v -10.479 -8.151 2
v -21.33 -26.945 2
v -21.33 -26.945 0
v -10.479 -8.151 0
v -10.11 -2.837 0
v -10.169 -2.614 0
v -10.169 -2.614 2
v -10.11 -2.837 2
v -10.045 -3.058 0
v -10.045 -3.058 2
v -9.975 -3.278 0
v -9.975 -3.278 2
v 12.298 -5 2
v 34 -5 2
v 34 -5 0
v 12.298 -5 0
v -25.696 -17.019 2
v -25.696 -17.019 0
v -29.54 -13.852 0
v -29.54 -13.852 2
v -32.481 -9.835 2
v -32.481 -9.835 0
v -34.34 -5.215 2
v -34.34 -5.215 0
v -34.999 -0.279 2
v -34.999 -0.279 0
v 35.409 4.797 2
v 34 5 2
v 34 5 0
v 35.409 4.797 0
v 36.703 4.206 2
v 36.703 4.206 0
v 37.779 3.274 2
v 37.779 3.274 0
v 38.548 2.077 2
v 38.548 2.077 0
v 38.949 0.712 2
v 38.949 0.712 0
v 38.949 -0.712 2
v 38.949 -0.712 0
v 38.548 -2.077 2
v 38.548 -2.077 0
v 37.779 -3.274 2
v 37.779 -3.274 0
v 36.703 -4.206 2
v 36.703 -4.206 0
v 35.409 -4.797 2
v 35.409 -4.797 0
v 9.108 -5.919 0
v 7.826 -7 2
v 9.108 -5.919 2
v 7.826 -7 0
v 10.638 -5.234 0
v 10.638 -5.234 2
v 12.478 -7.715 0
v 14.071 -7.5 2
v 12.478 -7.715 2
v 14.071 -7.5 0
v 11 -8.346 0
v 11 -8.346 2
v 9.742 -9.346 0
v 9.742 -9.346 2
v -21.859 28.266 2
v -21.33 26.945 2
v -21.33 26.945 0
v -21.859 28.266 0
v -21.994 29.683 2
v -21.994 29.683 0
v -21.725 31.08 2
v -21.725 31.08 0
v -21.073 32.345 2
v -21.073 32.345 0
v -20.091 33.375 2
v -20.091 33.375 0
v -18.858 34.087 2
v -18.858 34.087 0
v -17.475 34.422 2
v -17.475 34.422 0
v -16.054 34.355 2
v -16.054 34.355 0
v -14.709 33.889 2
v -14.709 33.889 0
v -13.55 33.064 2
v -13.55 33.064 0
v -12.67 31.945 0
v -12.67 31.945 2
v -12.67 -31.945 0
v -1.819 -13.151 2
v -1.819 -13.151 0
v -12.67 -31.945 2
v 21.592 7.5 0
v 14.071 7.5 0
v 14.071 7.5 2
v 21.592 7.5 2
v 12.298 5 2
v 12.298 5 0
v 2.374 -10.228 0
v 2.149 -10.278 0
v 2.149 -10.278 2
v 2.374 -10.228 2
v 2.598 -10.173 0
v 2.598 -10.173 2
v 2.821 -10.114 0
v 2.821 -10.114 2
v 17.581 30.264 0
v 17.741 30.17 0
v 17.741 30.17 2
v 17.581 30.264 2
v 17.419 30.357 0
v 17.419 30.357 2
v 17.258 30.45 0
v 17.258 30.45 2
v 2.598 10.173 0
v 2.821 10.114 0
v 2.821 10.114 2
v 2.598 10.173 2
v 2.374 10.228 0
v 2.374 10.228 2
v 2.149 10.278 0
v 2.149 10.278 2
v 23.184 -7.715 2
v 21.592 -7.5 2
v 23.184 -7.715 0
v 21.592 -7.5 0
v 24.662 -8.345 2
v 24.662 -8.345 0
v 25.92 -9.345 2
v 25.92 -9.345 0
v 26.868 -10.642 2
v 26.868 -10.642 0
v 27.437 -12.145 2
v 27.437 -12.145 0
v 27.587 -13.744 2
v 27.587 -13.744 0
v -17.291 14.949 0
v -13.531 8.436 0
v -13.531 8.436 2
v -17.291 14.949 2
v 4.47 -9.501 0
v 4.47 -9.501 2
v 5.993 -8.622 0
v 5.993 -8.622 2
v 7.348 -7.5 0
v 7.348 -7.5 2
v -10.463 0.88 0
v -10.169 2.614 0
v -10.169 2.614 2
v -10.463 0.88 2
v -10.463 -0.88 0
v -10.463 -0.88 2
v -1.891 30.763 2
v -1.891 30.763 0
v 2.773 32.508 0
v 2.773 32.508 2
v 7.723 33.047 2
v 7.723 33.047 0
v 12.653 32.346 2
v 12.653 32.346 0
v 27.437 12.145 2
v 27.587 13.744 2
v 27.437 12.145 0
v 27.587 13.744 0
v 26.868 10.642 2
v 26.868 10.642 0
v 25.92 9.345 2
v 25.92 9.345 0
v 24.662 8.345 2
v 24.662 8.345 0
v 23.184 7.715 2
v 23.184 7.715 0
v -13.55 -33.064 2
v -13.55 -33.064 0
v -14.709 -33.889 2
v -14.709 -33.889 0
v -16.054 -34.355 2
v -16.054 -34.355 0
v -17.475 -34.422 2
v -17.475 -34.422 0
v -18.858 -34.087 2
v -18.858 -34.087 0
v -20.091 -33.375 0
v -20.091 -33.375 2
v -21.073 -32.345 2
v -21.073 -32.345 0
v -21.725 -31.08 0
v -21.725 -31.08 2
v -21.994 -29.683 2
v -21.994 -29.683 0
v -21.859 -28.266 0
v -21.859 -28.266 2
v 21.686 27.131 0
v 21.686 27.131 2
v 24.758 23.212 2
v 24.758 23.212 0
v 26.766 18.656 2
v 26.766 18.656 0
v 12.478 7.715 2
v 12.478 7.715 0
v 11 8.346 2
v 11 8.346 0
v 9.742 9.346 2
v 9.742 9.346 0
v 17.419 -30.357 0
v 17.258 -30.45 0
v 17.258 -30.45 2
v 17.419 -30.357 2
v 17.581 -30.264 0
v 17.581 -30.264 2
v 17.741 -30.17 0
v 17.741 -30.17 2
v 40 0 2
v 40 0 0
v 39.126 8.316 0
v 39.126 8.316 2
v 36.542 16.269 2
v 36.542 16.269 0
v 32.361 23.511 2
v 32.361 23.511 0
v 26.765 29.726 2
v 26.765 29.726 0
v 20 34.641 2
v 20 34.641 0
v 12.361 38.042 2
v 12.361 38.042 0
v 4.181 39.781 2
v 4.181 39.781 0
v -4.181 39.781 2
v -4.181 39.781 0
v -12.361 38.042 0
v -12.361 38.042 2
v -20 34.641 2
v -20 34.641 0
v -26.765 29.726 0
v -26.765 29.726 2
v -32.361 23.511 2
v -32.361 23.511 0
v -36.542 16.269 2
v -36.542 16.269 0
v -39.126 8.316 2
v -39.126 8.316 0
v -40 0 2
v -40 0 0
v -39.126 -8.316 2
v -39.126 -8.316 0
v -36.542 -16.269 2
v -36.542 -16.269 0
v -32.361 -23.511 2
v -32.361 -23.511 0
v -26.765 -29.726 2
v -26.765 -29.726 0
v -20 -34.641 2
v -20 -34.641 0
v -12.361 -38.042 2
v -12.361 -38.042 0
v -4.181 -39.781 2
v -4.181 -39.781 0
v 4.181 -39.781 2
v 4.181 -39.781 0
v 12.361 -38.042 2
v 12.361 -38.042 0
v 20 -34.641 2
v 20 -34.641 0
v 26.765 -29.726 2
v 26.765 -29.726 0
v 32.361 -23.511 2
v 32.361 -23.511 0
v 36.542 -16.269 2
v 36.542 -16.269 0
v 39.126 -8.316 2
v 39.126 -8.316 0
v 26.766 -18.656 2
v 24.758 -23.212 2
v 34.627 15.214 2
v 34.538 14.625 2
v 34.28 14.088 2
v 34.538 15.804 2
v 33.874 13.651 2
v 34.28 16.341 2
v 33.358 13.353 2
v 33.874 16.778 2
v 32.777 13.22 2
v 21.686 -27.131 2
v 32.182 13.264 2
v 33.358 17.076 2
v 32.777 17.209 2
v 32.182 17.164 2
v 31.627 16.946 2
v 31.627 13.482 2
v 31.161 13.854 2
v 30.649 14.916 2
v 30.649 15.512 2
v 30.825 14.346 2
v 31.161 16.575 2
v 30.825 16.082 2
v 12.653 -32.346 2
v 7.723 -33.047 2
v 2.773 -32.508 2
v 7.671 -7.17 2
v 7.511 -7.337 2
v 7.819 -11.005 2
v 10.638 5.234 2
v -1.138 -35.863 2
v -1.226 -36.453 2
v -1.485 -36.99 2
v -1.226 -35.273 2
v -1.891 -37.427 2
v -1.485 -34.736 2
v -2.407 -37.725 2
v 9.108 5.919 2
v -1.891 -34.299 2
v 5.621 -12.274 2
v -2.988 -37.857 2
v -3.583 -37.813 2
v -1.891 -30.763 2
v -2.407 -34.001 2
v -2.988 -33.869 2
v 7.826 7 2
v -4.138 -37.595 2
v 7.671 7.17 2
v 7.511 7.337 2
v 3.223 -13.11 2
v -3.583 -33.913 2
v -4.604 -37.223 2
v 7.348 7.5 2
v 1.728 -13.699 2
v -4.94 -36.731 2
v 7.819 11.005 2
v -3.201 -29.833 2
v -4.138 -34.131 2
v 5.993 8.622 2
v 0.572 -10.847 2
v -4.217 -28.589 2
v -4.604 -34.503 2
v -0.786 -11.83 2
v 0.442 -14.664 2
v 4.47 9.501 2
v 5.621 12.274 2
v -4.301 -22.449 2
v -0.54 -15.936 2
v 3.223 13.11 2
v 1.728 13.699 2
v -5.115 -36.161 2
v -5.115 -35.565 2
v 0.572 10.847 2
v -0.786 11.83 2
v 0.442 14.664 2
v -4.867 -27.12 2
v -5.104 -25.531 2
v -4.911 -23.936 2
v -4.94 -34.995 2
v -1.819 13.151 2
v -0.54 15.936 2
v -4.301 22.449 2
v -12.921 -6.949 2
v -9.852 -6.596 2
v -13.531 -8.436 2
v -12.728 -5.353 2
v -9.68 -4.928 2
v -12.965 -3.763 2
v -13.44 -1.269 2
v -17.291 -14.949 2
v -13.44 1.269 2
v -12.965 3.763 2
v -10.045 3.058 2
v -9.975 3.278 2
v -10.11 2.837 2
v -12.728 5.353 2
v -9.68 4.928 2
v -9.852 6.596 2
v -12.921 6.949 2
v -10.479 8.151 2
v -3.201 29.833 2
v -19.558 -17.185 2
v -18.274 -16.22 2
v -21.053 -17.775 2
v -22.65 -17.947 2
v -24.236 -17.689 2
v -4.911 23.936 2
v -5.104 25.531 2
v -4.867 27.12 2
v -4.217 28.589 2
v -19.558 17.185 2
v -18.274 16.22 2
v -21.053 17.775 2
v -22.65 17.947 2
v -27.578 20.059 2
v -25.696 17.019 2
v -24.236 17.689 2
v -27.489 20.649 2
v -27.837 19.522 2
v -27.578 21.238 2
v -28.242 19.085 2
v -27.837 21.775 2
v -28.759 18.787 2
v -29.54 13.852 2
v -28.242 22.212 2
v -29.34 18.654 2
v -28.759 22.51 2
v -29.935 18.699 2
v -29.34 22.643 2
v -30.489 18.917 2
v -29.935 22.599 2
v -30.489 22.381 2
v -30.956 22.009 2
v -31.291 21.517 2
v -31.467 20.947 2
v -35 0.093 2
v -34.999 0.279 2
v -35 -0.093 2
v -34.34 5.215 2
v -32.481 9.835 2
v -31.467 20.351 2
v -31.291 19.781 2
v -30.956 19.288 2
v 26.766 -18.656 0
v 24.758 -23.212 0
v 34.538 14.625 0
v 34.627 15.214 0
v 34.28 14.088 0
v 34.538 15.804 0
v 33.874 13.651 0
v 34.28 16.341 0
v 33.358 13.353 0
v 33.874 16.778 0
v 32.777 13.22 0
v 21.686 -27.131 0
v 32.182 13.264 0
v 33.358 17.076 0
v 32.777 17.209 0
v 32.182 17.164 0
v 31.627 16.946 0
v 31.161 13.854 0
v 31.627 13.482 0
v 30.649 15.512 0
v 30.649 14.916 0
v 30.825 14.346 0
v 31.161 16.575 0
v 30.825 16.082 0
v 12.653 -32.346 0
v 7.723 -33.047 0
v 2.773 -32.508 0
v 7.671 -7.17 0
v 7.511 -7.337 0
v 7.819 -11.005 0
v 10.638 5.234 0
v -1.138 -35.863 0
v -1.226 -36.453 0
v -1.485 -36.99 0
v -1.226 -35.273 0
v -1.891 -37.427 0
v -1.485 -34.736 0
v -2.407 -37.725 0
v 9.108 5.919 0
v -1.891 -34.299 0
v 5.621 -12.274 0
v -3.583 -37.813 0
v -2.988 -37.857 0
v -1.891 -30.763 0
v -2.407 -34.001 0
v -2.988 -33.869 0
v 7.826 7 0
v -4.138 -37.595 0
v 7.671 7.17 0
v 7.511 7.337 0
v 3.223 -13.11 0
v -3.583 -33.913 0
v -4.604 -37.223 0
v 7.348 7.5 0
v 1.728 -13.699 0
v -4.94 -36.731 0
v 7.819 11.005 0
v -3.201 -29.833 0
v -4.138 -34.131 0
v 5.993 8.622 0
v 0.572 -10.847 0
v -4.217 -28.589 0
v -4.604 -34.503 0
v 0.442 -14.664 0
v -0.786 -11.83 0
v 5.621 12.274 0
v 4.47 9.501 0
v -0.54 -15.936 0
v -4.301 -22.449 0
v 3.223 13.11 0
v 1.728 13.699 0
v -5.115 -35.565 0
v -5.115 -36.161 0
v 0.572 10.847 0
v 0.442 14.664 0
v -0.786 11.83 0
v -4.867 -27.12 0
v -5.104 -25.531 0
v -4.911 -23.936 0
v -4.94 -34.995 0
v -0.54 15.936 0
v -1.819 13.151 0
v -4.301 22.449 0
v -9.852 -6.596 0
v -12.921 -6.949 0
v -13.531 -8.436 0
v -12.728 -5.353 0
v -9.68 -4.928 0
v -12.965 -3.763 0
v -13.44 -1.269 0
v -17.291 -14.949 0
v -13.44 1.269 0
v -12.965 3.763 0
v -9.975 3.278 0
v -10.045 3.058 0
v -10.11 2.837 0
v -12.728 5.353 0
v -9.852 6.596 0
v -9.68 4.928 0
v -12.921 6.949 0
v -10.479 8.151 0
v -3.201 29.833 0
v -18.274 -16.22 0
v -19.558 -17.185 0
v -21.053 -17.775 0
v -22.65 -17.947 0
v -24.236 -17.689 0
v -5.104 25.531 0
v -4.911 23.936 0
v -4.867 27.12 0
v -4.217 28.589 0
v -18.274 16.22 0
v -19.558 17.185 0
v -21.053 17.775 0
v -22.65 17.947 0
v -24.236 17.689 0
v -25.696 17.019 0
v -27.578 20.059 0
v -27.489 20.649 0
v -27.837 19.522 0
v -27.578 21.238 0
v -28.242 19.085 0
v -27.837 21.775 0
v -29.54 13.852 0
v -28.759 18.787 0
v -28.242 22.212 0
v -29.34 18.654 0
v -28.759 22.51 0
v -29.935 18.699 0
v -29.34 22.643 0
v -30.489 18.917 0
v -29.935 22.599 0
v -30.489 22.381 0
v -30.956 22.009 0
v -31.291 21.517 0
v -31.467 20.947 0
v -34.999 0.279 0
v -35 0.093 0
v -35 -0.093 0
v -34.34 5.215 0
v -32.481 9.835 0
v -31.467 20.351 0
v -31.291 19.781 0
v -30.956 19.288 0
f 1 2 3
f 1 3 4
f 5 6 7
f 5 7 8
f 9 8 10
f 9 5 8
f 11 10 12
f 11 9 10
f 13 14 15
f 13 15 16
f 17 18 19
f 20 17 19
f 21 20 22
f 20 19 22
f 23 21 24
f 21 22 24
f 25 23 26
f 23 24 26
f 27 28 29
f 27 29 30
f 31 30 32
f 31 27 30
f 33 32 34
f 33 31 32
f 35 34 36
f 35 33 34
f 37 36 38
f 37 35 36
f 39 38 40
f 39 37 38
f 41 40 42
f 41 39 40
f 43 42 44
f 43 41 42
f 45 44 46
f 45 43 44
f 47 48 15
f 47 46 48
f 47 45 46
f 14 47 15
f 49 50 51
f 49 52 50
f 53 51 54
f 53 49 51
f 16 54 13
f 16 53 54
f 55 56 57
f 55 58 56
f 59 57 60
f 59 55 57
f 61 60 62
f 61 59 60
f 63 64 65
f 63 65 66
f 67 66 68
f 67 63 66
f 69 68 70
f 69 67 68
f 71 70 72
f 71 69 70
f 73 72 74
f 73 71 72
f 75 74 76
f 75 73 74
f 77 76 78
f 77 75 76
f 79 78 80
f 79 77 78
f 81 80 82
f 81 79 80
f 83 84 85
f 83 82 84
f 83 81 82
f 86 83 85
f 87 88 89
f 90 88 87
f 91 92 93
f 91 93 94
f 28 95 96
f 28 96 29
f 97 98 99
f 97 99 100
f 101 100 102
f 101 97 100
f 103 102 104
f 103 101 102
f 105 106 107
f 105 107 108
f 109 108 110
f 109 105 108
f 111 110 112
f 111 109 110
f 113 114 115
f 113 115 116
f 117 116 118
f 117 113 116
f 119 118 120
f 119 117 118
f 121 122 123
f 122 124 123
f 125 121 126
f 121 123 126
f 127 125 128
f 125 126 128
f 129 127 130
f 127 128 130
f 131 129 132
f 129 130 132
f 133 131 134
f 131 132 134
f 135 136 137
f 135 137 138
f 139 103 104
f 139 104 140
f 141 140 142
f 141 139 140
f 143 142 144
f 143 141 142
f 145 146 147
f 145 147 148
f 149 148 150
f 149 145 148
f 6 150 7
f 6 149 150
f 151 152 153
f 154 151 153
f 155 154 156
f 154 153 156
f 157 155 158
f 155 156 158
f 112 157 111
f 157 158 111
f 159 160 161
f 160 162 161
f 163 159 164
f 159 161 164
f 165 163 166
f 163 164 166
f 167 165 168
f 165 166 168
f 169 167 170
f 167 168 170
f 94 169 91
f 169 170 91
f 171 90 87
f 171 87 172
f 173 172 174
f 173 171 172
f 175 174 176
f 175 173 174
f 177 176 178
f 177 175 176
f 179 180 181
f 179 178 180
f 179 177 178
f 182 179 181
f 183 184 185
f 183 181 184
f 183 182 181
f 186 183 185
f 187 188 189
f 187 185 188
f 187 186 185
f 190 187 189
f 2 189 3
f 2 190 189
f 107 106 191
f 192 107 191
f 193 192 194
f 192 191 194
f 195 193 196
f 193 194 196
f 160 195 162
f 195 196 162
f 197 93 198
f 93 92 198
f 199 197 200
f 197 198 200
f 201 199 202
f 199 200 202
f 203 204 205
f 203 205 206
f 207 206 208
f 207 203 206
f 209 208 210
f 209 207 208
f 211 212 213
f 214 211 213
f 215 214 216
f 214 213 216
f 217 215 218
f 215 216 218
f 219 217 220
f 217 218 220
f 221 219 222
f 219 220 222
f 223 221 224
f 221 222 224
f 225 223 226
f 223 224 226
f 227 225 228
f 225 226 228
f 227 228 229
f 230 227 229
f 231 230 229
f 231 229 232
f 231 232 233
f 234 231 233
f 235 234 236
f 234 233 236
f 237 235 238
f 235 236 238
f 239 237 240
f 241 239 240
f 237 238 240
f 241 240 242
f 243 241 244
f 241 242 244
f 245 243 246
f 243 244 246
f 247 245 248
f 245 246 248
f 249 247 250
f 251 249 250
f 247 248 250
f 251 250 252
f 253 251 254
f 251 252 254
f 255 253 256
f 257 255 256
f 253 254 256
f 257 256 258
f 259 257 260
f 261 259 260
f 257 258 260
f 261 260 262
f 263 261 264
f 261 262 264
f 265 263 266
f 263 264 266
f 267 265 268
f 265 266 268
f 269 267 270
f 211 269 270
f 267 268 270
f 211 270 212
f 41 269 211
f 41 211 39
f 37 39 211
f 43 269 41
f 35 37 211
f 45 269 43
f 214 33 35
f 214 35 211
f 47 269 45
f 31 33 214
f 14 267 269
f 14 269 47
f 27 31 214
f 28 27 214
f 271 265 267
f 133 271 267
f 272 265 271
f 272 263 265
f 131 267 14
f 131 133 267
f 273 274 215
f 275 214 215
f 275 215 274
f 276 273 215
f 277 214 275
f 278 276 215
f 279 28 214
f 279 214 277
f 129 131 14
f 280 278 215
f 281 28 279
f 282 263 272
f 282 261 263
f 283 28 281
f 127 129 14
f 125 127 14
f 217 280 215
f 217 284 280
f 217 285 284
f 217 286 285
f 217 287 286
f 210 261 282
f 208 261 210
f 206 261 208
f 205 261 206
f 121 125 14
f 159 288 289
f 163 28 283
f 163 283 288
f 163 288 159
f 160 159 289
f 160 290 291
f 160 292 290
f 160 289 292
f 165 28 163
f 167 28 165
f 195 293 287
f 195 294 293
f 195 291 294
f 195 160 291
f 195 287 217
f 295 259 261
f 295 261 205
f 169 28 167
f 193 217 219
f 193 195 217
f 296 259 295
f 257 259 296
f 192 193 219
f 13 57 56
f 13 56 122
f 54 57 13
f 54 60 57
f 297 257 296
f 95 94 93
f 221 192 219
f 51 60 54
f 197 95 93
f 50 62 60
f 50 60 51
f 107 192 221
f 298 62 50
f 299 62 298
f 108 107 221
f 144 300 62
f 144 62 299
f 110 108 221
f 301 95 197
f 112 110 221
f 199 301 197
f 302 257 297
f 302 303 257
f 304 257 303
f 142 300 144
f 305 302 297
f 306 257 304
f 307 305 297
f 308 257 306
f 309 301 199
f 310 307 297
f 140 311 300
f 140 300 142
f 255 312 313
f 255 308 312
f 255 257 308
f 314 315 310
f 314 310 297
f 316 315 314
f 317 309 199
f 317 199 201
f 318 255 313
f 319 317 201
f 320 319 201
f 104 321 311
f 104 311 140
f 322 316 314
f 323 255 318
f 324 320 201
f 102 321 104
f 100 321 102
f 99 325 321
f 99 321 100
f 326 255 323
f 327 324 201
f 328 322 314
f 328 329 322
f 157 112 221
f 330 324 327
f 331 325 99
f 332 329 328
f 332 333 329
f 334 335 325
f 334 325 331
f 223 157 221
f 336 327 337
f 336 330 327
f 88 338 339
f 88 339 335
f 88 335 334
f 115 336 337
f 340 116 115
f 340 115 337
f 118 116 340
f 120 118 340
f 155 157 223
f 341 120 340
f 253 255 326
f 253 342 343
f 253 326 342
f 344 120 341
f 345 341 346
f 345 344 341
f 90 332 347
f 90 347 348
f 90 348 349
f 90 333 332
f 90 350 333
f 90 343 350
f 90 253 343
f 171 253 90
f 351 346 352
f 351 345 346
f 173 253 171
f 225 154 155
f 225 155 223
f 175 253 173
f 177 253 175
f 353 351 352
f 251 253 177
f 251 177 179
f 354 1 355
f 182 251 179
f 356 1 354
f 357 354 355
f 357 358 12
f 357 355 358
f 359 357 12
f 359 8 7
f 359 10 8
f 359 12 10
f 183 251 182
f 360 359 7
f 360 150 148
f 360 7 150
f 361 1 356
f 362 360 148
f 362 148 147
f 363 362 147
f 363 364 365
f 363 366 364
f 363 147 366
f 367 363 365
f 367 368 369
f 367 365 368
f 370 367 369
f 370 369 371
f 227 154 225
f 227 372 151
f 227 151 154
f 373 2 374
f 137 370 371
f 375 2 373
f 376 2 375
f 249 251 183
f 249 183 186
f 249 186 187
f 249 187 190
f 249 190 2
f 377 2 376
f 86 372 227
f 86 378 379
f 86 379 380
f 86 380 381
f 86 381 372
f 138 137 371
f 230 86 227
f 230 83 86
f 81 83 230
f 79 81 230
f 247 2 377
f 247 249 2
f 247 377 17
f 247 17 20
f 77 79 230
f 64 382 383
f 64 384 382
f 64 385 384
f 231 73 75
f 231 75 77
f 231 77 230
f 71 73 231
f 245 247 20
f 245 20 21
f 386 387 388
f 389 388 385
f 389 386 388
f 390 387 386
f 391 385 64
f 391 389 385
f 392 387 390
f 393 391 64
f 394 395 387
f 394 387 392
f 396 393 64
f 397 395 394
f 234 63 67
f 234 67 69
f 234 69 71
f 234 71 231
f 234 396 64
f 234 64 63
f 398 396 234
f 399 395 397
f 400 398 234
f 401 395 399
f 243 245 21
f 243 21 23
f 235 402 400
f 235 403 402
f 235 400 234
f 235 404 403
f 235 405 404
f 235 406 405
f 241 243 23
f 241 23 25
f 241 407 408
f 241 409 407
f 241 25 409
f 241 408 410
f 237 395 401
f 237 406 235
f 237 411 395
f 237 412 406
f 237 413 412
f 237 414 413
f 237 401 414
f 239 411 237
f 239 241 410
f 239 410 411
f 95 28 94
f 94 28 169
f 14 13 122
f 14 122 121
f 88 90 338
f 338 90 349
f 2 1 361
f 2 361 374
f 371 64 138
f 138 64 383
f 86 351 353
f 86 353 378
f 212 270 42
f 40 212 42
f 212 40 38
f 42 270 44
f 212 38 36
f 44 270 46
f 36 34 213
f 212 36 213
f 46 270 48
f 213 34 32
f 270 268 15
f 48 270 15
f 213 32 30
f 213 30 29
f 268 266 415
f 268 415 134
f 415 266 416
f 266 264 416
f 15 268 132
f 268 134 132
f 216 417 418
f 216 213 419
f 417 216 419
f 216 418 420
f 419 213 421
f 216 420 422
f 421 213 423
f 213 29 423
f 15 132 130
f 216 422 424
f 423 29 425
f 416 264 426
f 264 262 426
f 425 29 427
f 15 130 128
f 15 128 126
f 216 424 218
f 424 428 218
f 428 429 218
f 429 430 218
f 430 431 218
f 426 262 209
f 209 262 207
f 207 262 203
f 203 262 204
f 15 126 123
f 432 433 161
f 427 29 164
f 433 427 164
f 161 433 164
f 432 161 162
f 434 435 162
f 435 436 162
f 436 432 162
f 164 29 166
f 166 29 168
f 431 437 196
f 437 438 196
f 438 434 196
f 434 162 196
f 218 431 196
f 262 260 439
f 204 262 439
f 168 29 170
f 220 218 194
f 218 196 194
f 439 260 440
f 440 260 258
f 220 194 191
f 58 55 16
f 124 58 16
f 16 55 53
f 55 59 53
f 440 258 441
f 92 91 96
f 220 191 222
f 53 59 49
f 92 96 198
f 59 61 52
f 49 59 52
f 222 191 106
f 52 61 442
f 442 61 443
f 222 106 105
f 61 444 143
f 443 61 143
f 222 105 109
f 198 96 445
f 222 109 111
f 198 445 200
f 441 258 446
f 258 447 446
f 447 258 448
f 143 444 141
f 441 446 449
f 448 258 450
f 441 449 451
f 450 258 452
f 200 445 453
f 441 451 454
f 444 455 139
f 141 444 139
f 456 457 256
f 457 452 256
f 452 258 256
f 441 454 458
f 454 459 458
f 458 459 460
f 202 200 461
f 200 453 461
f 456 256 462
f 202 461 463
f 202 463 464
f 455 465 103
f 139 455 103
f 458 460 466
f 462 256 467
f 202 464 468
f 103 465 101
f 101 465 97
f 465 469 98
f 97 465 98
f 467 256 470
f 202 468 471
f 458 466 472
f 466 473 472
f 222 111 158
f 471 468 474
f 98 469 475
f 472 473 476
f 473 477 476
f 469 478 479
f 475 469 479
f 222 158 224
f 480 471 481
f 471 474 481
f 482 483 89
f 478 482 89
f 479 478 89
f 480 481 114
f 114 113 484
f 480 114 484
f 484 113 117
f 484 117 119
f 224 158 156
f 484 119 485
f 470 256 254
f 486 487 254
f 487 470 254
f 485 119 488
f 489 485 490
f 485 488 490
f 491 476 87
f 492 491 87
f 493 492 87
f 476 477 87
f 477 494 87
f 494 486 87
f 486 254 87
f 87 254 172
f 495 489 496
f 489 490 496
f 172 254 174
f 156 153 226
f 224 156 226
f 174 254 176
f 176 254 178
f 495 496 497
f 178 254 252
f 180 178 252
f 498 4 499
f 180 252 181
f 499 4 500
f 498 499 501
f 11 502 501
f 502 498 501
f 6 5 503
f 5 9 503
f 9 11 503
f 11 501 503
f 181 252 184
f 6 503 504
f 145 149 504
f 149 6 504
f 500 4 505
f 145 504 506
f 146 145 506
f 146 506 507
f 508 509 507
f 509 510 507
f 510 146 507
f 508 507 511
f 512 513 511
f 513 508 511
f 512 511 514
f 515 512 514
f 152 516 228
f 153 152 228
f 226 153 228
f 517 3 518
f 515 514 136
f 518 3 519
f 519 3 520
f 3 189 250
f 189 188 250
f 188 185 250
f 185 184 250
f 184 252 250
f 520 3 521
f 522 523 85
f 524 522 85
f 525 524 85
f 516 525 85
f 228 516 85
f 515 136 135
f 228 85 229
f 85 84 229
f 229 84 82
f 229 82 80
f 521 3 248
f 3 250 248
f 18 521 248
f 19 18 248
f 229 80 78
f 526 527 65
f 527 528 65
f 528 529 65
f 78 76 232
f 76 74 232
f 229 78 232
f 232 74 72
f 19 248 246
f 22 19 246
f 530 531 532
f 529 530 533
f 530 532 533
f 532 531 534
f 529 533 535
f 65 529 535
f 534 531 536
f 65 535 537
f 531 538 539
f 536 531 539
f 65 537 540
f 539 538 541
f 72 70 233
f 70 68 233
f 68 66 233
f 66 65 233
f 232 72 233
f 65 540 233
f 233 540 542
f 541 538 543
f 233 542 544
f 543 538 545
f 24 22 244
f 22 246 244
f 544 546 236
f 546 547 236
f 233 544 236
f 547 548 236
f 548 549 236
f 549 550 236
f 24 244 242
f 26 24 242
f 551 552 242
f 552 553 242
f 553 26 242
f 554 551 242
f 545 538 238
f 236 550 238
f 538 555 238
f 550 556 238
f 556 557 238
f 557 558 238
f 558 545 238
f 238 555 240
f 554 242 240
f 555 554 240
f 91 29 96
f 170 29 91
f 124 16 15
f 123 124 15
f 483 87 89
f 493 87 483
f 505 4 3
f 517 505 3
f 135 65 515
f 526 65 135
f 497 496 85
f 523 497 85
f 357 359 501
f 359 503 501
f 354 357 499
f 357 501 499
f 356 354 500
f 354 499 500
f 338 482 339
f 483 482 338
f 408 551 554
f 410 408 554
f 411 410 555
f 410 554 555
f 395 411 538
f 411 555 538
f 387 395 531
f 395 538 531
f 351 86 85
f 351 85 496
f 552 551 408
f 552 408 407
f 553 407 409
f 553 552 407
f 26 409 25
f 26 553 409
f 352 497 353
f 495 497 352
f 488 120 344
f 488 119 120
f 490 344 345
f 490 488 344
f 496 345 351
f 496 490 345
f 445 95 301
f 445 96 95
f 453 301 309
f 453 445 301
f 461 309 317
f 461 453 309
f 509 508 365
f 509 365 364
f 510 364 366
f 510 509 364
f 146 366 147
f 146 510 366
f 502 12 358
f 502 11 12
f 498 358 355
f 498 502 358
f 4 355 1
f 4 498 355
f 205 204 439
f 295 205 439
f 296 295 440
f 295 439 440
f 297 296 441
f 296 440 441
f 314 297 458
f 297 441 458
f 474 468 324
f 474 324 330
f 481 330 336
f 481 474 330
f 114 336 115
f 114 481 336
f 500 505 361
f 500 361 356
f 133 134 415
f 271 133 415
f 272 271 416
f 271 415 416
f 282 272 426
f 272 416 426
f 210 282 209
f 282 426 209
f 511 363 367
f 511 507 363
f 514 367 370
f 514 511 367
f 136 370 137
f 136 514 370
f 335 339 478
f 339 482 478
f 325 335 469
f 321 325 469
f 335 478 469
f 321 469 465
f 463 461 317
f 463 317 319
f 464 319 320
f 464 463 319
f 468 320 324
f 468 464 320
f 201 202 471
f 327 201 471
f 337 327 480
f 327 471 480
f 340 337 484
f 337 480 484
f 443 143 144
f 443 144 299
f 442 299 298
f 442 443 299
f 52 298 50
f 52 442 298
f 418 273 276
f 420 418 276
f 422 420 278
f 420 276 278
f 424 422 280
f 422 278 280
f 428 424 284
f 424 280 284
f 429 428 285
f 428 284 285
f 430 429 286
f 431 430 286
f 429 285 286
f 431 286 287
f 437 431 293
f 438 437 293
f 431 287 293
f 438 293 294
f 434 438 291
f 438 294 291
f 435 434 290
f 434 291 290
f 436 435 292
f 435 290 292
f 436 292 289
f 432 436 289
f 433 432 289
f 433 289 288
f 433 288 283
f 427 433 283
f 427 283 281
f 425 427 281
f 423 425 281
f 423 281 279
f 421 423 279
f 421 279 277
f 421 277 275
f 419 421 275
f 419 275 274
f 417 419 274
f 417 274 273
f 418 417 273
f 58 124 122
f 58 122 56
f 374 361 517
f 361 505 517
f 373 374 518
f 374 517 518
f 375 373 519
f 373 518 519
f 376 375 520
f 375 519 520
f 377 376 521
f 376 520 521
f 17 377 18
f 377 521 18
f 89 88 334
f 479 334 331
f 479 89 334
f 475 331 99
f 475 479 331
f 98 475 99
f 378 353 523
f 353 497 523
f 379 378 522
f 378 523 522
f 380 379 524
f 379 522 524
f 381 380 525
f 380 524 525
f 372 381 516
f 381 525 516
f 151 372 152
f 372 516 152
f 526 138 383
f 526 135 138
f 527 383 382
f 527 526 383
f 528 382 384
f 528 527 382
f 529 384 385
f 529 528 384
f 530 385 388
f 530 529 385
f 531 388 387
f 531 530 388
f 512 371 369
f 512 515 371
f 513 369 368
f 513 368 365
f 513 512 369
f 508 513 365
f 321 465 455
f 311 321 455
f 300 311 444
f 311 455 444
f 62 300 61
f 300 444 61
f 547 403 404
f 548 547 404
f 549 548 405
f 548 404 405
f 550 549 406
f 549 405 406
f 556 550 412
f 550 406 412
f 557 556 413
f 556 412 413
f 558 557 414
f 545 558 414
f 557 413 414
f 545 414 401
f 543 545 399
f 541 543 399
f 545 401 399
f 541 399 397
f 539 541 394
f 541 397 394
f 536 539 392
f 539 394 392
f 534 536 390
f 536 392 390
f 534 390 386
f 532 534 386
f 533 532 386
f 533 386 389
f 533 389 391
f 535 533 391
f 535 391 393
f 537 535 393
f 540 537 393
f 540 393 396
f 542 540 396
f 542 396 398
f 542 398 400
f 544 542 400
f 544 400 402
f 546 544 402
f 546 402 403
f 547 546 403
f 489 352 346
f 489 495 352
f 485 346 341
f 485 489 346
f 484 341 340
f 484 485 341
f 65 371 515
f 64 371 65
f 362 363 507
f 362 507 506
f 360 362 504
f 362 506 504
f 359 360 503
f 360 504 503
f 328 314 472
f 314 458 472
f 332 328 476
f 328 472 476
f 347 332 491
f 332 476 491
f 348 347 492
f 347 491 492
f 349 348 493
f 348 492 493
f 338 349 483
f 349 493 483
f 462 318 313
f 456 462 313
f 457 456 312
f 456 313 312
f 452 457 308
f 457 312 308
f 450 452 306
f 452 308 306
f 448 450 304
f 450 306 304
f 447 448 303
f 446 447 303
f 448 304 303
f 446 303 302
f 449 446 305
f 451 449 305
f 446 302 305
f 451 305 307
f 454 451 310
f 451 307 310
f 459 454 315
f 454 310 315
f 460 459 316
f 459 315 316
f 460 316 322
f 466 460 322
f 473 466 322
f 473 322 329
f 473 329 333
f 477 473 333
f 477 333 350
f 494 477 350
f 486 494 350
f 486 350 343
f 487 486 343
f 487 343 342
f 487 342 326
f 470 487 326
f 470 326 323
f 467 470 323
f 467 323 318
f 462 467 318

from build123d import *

# Parameters (mm, degrees)
SKETCH1_R                = 40
SKETCH1_R_2              = 35
BOSS_EXTRUDE1_DEPTH      = 2
BOSS_EXTRUDE2_DEPTH      = 2
SKETCH3_R                = 3
CUT_EXTRUDE1_DEPTH       = 2
FILLET1_DEPTH            = 2
SKETCH4_R                = 2
CUT_EXTRUDE2_DEPTH       = 10
BOSS_EXTRUDE3_START      = -2
BOSS_EXTRUDE3_DEPTH      = 2
BOSS_EXTRUDE4_START      = -2
SKETCH7_R                = 13.5
SKETCH7_R_2              = 10.5
BOSS_EXTRUDE4_DEPTH      = 2
FILLET2_R                = 6
CUT_EXTRUDE3_DEPTH       = 3
CIRPATTERN1_COUNT        = 3
FILLET2_OF_CIRPATTERN1_R = 6
FILLET3_R                = 6


with BuildPart() as part:
    # Sketch1 → Boss-Extrude1 (new body)
    with BuildSketch(Plane.XY):
        Circle(SKETCH1_R)
        Circle(SKETCH1_R_2, mode=Mode.SUBTRACT)
    extrude(amount=BOSS_EXTRUDE1_DEPTH)

    # Sketch2 → Boss-Extrude2 (add)
    with BuildSketch(Plane(origin=(0, 0, 0), x_dir=(-1, 0, 0), z_dir=(0, 0, -1))):
        with BuildLine():
            Line((-29, 5), (-34.641016151, 5))
            Line((-34.641016151, 5), (-37.165171868, 5))
            ThreePointArc((-37.165171868, 5), (-37.5, 0), (-37.165171868, -5))
            Line((-37.165171868, -5), (-29, -5))
            ThreePointArc((-29, -5), (-24, 0), (-29, 5))
        make_face()
        with BuildLine():
            Line((-34, -3), (-29, -3))
            ThreePointArc((-29, -3), (-26, 0), (-29, 3))
            Line((-29, 3), (-34, 3))
            ThreePointArc((-34, 3), (-37, 0), (-34, -3))
        make_face(mode=Mode.SUBTRACT)
    boss_extrude2 = extrude(amount=-BOSS_EXTRUDE2_DEPTH)

    # Sketch3 → Cut-Extrude1 (cut)
    with BuildSketch(Plane(origin=(0, 0, 0), x_dir=(-1, 0, 0), z_dir=(0, 0, -1))):
        with Locations((-34, 0)):
            Circle(SKETCH3_R)
    cut_extrude1 = extrude(amount=-CUT_EXTRUDE1_DEPTH, mode=Mode.SUBTRACT)

    # Fillet1: read off the stored shape, not the designer's step
    # Fillet1 outline → Fillet1 (add)
    with BuildSketch(Plane.XY):
        with BuildLine():
            ThreePointArc((29, -5), (26.543386825, -4.354888254), (24.720689655, -2.586020683))
            ThreePointArc((24.720689655, -2.586020683), (26.992450638, -17.835874241), (17.74137931, -30.170241301))
            ThreePointArc((17.74137931, -30.170241301), (29.057943842, -19.509892353), (34.641016151, -5))
            Line((34.641016151, -5), (29, -5))
        make_face()
        with BuildLine():
            ThreePointArc((17.74137931, 30.170241301), (26.992450638, 17.835874241), (24.720689655, 2.586020683))
            ThreePointArc((24.720689655, 2.586020683), (26.543386825, 4.354888254), (29, 5))
            Line((29, 5), (34.641016151, 5))
            ThreePointArc((34.641016151, 5), (29.057943842, 19.509892353), (17.74137931, 30.170241301))
        make_face()
    fillet1 = extrude(amount=FILLET1_DEPTH)

    # Sketch4 → Cut-Extrude2 (cut)
    with BuildSketch(Plane.XY.offset(2)):
        with Locations((32.627080333, 15.214257423)):
            Circle(SKETCH4_R)
    cut_extrude2 = extrude(amount=-CUT_EXTRUDE2_DEPTH, mode=Mode.SUBTRACT)

    # Sketch5 → Boss-Extrude3 (add)
    with BuildSketch(Plane.XY.offset(2).offset(BOSS_EXTRUDE3_START)):
        with BuildLine():
            Line((7.348469228, 7.5), (34.186985828, 7.5))
            ThreePointArc((34.186985828, 7.5), (34.60231879, 5.261134323), (34.871191548, 3))
            Line((34.871191548, 3), (29, 3))
            ThreePointArc((29, 3), (26, 0), (29, -3))
            Line((29, -3), (34.871191548, -3))
            ThreePointArc((34.871191548, -3), (34.60231879, -5.261134323), (34.186985828, -7.5))
            Line((34.186985828, -7.5), (7.348469228, -7.5))
            ThreePointArc((7.348469228, -7.5), (10.5, 0), (7.348469228, 7.5))
        make_face()
    boss_extrude3 = extrude(amount=BOSS_EXTRUDE3_DEPTH)

    # Sketch7 → Boss-Extrude4 (add)
    with BuildSketch(Plane.XY.offset(2).offset(BOSS_EXTRUDE4_START)):
        Circle(SKETCH7_R)
        with Locations(Location((0, 0, 0), (0, 0, 180))):
            Circle(SKETCH7_R_2, mode=Mode.SUBTRACT)
    extrude(amount=BOSS_EXTRUDE4_DEPTH)

    # Fillet2
    fillet2_edges = [part.edges().sort_by_distance(p)[0] for p in [
        (11.22497216, 7.5, 1),
        (11.22497216, -7.5, 1),
        (26.852187894, 7.5, 1),
        (26.852187894, -7.5, 1),
    ]]
    fillet(fillet2_edges, radius=FILLET2_R)

    # Sketch6 → Cut-Extrude3 (cut)
    with BuildSketch(Plane.XY.offset(2)):
        with BuildLine():
            Line((0, 5), (34, 5))
            ThreePointArc((34, 5), (39, 0), (34, -5))
            Line((34, -5), (0, -5))
            Line((0, -5), (0, 5))
        make_face()
    cut_extrude3 = extrude(amount=-CUT_EXTRUDE3_DEPTH, mode=Mode.SUBTRACT)

    # CirPattern1: Boss-Extrude2, Cut-Extrude1, Fillet1, Cut-Extrude2, Boss-Extrude3, Cut-Extrude3 ×3 about axis
    cirpattern1_axis = Axis((0, 0, 0), (0, 0, 1))
    add([boss_extrude2.rotate(cirpattern1_axis, i * 360 / CIRPATTERN1_COUNT) for i in range(1, CIRPATTERN1_COUNT)])
    add([cut_extrude1.rotate(cirpattern1_axis, i * 360 / CIRPATTERN1_COUNT) for i in range(1, CIRPATTERN1_COUNT)], mode=Mode.SUBTRACT)
    add([fillet1.rotate(cirpattern1_axis, i * 360 / CIRPATTERN1_COUNT) for i in range(1, CIRPATTERN1_COUNT)])
    add([cut_extrude2.rotate(cirpattern1_axis, i * 360 / CIRPATTERN1_COUNT) for i in range(1, CIRPATTERN1_COUNT)], mode=Mode.SUBTRACT)
    add([boss_extrude3.rotate(cirpattern1_axis, i * 360 / CIRPATTERN1_COUNT) for i in range(1, CIRPATTERN1_COUNT)])
    add([cut_extrude3.rotate(cirpattern1_axis, i * 360 / CIRPATTERN1_COUNT) for i in range(1, CIRPATTERN1_COUNT)], mode=Mode.SUBTRACT)

    # Fillet2 of CirPattern1
    fillet2_of_cirpattern1_edges = [part.edges().sort_by_distance(p)[0] for p in [
        (-12.107676609, 5.971111048, 1),
        (0.882704448, 13.471111048, 1),
        (-19.921284476, 19.504676864, 1),
        (-6.930903419, 27.004676864, 1),
        (0.882704448, -13.471111048, 1),
        (-12.107676609, -5.971111048, 1),
        (-6.930903419, -27.004676864, 1),
        (-19.921284476, -19.504676864, 1),
    ]]
    fillet(fillet2_of_cirpattern1_edges, radius=FILLET2_OF_CIRPATTERN1_R)

    # Fillet3
    fillet3_edges = [part.edges().sort_by_distance(p)[0] for p in [
        (9.233092656, -5, 1),
        (9.233092656, 5, 1),
        (-0.286419309, 10.496092796, 1),
        (-8.946673347, 5.496092796, 1),
        (-8.946673347, -5.496092796, 1),
        (-0.286419309, -10.496092796, 1),
    ]]
    fillet(fillet3_edges, radius=FILLET3_R)


solid = part.part
